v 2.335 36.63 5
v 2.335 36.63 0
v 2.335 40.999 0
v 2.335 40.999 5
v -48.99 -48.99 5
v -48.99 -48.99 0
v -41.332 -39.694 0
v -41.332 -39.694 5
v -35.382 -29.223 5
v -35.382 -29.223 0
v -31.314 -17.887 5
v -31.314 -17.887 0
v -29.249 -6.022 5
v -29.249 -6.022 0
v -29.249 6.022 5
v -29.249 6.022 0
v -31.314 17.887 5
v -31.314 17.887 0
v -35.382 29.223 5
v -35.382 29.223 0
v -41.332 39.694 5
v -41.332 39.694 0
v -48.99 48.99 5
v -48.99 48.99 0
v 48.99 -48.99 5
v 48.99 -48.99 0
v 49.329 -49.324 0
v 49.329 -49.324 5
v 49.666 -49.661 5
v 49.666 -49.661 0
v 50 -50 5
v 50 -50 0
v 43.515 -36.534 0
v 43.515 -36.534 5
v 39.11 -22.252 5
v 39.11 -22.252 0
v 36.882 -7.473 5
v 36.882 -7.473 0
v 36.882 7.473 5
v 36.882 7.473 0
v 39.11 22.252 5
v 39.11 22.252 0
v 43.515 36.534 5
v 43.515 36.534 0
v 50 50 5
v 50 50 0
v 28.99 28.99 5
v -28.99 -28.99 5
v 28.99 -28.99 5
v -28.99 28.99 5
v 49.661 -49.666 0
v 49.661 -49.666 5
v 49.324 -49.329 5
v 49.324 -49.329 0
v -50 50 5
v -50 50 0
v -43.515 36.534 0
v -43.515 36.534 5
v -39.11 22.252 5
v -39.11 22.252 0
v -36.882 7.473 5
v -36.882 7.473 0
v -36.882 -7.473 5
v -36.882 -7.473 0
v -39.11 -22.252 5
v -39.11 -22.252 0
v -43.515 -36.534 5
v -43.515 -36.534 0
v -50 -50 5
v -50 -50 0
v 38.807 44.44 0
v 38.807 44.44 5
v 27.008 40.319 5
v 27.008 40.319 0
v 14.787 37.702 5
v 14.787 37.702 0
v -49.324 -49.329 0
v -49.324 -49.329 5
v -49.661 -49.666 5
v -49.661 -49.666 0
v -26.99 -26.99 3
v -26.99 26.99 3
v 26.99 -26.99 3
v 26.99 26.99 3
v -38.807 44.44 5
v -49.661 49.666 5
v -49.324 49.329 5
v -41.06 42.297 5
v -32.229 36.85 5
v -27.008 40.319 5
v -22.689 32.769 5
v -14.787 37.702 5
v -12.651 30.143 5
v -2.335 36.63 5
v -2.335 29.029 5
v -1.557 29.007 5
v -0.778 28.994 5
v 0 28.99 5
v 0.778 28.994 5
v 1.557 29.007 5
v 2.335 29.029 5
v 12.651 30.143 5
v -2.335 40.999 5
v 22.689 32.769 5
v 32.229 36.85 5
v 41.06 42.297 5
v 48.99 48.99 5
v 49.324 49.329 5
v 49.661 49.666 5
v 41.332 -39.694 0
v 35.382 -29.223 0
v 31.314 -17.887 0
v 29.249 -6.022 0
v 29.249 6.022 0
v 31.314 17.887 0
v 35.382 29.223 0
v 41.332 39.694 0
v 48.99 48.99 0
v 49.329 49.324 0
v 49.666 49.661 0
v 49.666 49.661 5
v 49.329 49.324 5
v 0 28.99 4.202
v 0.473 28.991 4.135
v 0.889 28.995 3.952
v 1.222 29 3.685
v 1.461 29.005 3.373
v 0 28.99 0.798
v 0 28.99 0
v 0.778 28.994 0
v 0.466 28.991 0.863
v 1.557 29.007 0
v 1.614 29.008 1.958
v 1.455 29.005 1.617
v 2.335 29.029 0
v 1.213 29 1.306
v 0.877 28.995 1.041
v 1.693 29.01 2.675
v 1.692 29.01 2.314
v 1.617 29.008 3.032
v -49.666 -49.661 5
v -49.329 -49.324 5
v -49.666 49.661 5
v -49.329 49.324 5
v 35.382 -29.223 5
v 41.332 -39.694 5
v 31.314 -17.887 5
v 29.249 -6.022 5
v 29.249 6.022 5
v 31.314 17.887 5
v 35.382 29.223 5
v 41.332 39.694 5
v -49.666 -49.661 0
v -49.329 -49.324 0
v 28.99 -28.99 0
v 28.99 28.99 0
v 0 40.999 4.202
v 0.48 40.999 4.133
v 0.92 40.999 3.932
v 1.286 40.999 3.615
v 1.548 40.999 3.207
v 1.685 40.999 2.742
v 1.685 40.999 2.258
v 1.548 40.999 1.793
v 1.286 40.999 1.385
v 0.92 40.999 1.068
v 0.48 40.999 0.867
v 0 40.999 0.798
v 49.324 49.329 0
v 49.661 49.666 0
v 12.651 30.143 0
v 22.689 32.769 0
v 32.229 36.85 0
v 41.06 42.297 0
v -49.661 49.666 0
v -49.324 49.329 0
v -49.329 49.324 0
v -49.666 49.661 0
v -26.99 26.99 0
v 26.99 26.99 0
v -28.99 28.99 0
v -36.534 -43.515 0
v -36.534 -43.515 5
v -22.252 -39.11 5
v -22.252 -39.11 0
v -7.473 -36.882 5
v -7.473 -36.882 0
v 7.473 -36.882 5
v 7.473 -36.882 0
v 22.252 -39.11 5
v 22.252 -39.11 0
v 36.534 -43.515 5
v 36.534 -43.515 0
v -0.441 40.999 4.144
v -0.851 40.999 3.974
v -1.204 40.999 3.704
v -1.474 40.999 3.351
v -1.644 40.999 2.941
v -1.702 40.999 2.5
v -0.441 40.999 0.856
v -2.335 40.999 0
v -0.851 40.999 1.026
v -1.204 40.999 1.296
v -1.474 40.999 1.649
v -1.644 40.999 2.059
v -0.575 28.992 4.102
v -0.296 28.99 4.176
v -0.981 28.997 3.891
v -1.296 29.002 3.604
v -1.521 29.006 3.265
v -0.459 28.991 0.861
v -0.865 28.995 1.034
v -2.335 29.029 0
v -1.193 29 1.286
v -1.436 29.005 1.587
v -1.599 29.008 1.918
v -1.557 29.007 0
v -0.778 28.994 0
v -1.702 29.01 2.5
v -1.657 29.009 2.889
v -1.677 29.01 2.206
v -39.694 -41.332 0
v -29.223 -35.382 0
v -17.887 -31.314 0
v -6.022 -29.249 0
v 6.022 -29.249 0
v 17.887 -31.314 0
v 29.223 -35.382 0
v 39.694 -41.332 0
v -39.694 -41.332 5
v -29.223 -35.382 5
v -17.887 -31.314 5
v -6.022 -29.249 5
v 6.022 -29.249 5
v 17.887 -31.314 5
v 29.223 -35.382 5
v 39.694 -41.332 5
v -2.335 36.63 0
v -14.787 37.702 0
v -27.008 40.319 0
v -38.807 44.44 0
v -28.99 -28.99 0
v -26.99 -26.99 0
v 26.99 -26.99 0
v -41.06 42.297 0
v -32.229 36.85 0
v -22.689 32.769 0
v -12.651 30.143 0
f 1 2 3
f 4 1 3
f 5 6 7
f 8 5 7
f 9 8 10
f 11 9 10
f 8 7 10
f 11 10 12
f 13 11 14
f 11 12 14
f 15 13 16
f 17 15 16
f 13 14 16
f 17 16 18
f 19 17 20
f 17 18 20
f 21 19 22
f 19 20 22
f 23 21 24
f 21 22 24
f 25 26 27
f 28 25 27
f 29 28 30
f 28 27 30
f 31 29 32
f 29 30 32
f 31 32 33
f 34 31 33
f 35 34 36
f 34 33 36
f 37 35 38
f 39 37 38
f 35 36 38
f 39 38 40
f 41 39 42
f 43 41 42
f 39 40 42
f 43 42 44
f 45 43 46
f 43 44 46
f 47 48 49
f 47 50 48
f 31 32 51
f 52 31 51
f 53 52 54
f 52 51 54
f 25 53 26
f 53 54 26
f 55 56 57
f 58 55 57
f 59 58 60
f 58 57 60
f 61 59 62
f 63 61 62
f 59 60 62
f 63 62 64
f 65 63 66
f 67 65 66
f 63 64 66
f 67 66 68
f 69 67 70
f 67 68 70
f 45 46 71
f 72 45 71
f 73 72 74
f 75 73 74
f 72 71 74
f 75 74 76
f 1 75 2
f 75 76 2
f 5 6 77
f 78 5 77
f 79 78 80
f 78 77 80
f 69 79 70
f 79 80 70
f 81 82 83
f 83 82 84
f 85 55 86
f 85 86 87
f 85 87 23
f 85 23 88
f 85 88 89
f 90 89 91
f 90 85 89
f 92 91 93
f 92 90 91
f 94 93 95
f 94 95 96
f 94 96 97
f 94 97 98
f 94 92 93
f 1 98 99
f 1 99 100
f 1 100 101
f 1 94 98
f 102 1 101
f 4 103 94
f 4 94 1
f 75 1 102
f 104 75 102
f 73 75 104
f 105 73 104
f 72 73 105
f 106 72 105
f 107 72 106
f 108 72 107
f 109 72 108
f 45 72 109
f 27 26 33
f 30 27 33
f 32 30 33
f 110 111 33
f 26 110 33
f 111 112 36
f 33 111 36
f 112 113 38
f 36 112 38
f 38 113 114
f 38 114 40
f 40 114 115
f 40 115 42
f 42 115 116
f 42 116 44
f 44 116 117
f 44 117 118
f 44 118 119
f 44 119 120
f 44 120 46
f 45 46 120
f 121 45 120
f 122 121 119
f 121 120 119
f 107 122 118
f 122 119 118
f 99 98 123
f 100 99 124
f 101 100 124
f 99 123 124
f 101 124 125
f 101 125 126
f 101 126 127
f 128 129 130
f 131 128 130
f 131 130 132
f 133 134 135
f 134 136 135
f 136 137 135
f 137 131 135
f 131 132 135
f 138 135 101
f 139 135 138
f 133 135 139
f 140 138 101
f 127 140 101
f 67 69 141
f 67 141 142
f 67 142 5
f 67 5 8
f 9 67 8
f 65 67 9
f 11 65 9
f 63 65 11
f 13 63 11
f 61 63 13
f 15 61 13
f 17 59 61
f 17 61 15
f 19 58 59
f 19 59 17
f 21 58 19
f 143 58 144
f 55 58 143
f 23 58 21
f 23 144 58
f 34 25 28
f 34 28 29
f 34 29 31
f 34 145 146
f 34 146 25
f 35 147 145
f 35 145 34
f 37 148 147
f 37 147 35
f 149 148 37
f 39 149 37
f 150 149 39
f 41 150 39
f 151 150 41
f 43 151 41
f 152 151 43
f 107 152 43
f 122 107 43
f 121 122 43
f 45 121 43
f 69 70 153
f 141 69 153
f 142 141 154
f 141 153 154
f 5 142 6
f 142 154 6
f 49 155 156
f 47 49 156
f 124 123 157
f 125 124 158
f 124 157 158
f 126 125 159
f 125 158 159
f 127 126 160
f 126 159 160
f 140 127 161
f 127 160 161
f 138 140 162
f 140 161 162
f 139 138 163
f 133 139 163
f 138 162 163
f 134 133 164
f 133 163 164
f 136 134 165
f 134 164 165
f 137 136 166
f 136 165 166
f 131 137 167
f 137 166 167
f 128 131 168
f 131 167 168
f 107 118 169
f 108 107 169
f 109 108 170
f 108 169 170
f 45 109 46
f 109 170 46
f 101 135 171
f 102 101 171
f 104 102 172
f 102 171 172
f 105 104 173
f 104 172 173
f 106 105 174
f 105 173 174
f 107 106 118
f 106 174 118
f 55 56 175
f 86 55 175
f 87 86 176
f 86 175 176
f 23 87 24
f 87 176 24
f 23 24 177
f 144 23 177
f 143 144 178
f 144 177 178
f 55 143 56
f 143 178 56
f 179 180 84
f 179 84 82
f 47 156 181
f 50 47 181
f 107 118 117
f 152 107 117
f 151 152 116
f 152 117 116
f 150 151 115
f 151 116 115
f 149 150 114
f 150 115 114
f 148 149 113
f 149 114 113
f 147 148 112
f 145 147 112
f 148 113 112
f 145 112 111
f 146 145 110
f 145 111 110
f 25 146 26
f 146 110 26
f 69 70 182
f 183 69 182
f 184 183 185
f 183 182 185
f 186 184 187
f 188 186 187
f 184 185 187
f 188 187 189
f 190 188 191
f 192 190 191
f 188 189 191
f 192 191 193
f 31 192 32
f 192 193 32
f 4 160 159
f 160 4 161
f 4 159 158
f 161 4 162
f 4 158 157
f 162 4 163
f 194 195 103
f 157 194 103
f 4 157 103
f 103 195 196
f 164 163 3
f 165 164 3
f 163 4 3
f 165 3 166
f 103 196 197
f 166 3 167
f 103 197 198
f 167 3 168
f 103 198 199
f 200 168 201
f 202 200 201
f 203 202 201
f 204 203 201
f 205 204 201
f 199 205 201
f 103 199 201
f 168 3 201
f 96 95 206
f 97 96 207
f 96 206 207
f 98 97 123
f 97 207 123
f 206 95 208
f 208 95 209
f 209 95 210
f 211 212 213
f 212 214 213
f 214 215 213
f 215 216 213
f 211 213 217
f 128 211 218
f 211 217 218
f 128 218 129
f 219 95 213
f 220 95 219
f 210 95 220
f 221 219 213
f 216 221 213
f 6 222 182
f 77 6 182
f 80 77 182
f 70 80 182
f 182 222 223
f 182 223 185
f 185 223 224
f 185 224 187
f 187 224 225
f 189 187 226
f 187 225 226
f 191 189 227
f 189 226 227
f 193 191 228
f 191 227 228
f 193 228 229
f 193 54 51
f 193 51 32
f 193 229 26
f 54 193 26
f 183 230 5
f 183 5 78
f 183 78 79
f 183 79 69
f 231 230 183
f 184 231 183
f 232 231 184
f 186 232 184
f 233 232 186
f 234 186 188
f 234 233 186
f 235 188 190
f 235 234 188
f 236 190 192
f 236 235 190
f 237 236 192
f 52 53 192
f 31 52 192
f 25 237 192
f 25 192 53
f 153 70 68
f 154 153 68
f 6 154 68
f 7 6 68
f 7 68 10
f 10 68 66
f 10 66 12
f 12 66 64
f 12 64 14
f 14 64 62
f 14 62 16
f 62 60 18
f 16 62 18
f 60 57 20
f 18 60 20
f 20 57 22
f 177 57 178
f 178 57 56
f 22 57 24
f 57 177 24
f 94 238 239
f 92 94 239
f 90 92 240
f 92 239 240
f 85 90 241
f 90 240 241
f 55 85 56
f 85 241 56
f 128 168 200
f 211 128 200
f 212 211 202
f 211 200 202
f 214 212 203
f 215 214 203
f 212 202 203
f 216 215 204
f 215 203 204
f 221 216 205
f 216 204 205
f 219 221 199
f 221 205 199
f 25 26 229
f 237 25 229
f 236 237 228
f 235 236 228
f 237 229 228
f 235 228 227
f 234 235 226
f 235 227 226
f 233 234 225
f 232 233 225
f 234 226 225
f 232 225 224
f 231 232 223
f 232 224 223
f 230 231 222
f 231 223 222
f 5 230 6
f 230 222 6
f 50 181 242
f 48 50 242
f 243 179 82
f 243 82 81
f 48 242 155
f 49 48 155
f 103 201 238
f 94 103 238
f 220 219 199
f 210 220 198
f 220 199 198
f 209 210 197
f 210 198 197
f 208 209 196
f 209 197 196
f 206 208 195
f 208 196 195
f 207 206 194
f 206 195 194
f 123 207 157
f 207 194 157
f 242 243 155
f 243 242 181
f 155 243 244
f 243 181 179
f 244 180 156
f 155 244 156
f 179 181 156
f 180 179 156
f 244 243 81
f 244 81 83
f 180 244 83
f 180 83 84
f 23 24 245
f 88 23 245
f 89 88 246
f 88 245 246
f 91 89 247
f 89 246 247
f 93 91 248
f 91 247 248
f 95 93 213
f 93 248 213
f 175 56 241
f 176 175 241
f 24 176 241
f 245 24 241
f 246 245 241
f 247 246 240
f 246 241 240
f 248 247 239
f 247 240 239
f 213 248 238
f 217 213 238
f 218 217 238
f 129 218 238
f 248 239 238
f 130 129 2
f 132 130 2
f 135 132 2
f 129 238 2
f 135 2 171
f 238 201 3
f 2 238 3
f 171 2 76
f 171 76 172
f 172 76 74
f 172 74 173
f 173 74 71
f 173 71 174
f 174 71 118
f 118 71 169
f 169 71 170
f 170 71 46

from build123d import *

# Parameters (mm, degrees)
F1_DEPTH = 5
F3_DEPTH = 100
F4_T     = -2


# Not quite as in the source:
# - a feature names something its author has since deleted; it is built from what else it names


with BuildPart() as f1:
    # F0 (on Top) → F1 (new body)
    with BuildSketch(Plane.XY):
        with BuildLine():
            ThreePointArc((48.9897948557, -48.9897948557), (49.4974746831, -49.4923201726), (50, -50))
            ThreePointArc((50, -50), (36.6025403784, 0), (50, 50))
            ThreePointArc((50, 50), (49.4974746831, 49.4923201726), (48.9897948557, 48.9897948557))
            ThreePointArc((48.9897948557, 48.9897948557), (34.1823878716, 26.4575131106), (28.9897948557, 0))
            ThreePointArc((28.9897948557, 0), (34.1823878716, -26.4575131106), (48.9897948557, -48.9897948557))
        make_face()
    extrude(amount=F1_DEPTH)


with BuildPart() as f1b:
    # F0 (on Top) → F1, piece 2 (new body)
    with BuildSketch(Plane.XY):
        with BuildLine():
            ThreePointArc((-50, -50), (0, -36.6025403784), (50, -50))
            ThreePointArc((50, -50), (49.4923201726, -49.4974746831), (48.9897948557, -48.9897948557))
            ThreePointArc((48.9897948557, -48.9897948557), (26.4575131106, -34.1823878716), (0, -28.9897948557))
            ThreePointArc((0, -28.9897948557), (-26.4575131106, -34.1823878716), (-48.9897948557, -48.9897948557))
            ThreePointArc((-48.9897948557, -48.9897948557), (-49.4923201726, -49.4974746831), (-50, -50))
        make_face()
    extrude(amount=F1_DEPTH)


with BuildPart() as f1c:
    # F0 (on Top) → F1, piece 3 (new body)
    with BuildSketch(Plane.XY):
        with BuildLine():
            ThreePointArc((-50, 50), (-36.6025403784, 0), (-50, -50))
            ThreePointArc((-50, -50), (-49.4974746831, -49.4923201726), (-48.9897948557, -48.9897948557))
            ThreePointArc((-48.9897948557, -48.9897948557), (-34.1823878716, -26.4575131106), (-28.9897948557, 0))
            ThreePointArc((-28.9897948557, 0), (-34.1823878716, 26.4575131106), (-48.9897948557, 48.9897948557))
            ThreePointArc((-48.9897948557, 48.9897948557), (-49.4974746831, 49.4923201726), (-50, 50))
        make_face()
    extrude(amount=F1_DEPTH)


with BuildPart() as f1d:
    # F0 (on Top) → F1, piece 4 (new body)
    with BuildSketch(Plane.XY):
        with BuildLine():
            ThreePointArc((48.9897948557, 48.9897948557), (49.4923201726, 49.4974746831), (50, 50))
            ThreePointArc((50, 50), (27.0079233825, 40.318730345), (2.3349747062, 36.6298046295))
            Line((2.3349747062, 36.6298046295), (2.3349747062, 29.0287493152))
            ThreePointArc((2.3349747062, 29.0287493152), (27.534865669, 34.6327348499), (48.9897948557, 48.9897948557))
        make_face()
        with BuildLine():
            ThreePointArc((-2.3349747062, 36.6298046295), (-27.0079233825, 40.318730345), (-50, 50))
            ThreePointArc((-50, 50), (-49.4923201726, 49.4974746831), (-48.9897948557, 48.9897948557))
            ThreePointArc((-48.9897948557, 48.9897948557), (-27.534865669, 34.6327348499), (-2.3349747062, 29.0287493152))
            Line((-2.3349747062, 29.0287493152), (-2.3349747062, 36.6298046295))
        make_face()
        with BuildLine():
            Line((2.3349747062, 29.0287493152), (2.3349747062, 36.6298046295))
            ThreePointArc((2.3349747062, 36.6298046295), (0, 36.6025403784), (-2.3349747062, 36.6298046295))
            Line((-2.3349747062, 36.6298046295), (-2.3349747062, 29.0287493152))
            ThreePointArc((-2.3349747062, 29.0287493152), (-1.1676498114, 28.9995341481), (0, 28.9897948557))
            ThreePointArc((0, 28.9897948557), (1.1676498114, 28.9995341481), (2.3349747062, 29.0287493152))
        make_face()
        with BuildLine():
            ThreePointArc((-2.3349747062, 36.6298046295), (0, 36.6025403784), (2.3349747062, 36.6298046295))
            Line((2.3349747062, 36.6298046295), (2.3349747062, 40.9987472145))
            Line((2.3349747062, 40.9987472145), (-2.3349747062, 40.9987472145))
            Line((-2.3349747062, 40.9987472145), (-2.3349747062, 36.6298046295))
        make_face()
    extrude(amount=F1_DEPTH)

    # F2 (on face) → F3 (cut)
    with BuildSketch(Plane(origin=(0, 40.9987472145, 0), x_dir=(-1, 0, 0), z_dir=(0, 1, 0))):
        with BuildLine():
            ThreePointArc((1.7021905713, 2.5), (1.2036304958, 3.7036304958), (0, 4.2021905713))
            Line((0, 4.2021905713), (0, 0.7978094287))
            ThreePointArc((0, 0.7978094287), (1.2036304958, 1.2963695042), (1.7021905713, 2.5))
        make_face()
        with BuildLine():
            Line((0, 0.7978094287), (0, 4.2021905713))
            ThreePointArc((0, 4.2021905713), (-1.7021905713, 2.5), (0, 0.7978094287))
        make_face()
    extrude(amount=-F3_DEPTH, mode=Mode.SUBTRACT)


with BuildPart() as f1e:
    # F0 (on Top) → F1, piece 5 (new body)
    with BuildSketch(Plane.XY):
        Polygon((-28.9897948557, -28.9897948557), (0, -28.9897948557), (28.9897948557, -28.9897948557), (28.9897948557, 0), (28.9897948557, 28.9897948557), (2.3349747062, 28.9897948557), (0, 28.9897948557), (-2.3349747062, 28.9897948557), (-28.9897948557, 28.9897948557), (-28.9897948557, 0), align=None)
    extrude(amount=F1_DEPTH)

    # F4
    f4_openings = [f1e.faces().sort_by_distance(p)[0] for p in [
        (0, 0, 0),
    ]]
    offset(amount=F4_T, openings=f4_openings)


solid = Compound([f1.part, f1b.part, f1c.part, f1d.part, f1e.part])
